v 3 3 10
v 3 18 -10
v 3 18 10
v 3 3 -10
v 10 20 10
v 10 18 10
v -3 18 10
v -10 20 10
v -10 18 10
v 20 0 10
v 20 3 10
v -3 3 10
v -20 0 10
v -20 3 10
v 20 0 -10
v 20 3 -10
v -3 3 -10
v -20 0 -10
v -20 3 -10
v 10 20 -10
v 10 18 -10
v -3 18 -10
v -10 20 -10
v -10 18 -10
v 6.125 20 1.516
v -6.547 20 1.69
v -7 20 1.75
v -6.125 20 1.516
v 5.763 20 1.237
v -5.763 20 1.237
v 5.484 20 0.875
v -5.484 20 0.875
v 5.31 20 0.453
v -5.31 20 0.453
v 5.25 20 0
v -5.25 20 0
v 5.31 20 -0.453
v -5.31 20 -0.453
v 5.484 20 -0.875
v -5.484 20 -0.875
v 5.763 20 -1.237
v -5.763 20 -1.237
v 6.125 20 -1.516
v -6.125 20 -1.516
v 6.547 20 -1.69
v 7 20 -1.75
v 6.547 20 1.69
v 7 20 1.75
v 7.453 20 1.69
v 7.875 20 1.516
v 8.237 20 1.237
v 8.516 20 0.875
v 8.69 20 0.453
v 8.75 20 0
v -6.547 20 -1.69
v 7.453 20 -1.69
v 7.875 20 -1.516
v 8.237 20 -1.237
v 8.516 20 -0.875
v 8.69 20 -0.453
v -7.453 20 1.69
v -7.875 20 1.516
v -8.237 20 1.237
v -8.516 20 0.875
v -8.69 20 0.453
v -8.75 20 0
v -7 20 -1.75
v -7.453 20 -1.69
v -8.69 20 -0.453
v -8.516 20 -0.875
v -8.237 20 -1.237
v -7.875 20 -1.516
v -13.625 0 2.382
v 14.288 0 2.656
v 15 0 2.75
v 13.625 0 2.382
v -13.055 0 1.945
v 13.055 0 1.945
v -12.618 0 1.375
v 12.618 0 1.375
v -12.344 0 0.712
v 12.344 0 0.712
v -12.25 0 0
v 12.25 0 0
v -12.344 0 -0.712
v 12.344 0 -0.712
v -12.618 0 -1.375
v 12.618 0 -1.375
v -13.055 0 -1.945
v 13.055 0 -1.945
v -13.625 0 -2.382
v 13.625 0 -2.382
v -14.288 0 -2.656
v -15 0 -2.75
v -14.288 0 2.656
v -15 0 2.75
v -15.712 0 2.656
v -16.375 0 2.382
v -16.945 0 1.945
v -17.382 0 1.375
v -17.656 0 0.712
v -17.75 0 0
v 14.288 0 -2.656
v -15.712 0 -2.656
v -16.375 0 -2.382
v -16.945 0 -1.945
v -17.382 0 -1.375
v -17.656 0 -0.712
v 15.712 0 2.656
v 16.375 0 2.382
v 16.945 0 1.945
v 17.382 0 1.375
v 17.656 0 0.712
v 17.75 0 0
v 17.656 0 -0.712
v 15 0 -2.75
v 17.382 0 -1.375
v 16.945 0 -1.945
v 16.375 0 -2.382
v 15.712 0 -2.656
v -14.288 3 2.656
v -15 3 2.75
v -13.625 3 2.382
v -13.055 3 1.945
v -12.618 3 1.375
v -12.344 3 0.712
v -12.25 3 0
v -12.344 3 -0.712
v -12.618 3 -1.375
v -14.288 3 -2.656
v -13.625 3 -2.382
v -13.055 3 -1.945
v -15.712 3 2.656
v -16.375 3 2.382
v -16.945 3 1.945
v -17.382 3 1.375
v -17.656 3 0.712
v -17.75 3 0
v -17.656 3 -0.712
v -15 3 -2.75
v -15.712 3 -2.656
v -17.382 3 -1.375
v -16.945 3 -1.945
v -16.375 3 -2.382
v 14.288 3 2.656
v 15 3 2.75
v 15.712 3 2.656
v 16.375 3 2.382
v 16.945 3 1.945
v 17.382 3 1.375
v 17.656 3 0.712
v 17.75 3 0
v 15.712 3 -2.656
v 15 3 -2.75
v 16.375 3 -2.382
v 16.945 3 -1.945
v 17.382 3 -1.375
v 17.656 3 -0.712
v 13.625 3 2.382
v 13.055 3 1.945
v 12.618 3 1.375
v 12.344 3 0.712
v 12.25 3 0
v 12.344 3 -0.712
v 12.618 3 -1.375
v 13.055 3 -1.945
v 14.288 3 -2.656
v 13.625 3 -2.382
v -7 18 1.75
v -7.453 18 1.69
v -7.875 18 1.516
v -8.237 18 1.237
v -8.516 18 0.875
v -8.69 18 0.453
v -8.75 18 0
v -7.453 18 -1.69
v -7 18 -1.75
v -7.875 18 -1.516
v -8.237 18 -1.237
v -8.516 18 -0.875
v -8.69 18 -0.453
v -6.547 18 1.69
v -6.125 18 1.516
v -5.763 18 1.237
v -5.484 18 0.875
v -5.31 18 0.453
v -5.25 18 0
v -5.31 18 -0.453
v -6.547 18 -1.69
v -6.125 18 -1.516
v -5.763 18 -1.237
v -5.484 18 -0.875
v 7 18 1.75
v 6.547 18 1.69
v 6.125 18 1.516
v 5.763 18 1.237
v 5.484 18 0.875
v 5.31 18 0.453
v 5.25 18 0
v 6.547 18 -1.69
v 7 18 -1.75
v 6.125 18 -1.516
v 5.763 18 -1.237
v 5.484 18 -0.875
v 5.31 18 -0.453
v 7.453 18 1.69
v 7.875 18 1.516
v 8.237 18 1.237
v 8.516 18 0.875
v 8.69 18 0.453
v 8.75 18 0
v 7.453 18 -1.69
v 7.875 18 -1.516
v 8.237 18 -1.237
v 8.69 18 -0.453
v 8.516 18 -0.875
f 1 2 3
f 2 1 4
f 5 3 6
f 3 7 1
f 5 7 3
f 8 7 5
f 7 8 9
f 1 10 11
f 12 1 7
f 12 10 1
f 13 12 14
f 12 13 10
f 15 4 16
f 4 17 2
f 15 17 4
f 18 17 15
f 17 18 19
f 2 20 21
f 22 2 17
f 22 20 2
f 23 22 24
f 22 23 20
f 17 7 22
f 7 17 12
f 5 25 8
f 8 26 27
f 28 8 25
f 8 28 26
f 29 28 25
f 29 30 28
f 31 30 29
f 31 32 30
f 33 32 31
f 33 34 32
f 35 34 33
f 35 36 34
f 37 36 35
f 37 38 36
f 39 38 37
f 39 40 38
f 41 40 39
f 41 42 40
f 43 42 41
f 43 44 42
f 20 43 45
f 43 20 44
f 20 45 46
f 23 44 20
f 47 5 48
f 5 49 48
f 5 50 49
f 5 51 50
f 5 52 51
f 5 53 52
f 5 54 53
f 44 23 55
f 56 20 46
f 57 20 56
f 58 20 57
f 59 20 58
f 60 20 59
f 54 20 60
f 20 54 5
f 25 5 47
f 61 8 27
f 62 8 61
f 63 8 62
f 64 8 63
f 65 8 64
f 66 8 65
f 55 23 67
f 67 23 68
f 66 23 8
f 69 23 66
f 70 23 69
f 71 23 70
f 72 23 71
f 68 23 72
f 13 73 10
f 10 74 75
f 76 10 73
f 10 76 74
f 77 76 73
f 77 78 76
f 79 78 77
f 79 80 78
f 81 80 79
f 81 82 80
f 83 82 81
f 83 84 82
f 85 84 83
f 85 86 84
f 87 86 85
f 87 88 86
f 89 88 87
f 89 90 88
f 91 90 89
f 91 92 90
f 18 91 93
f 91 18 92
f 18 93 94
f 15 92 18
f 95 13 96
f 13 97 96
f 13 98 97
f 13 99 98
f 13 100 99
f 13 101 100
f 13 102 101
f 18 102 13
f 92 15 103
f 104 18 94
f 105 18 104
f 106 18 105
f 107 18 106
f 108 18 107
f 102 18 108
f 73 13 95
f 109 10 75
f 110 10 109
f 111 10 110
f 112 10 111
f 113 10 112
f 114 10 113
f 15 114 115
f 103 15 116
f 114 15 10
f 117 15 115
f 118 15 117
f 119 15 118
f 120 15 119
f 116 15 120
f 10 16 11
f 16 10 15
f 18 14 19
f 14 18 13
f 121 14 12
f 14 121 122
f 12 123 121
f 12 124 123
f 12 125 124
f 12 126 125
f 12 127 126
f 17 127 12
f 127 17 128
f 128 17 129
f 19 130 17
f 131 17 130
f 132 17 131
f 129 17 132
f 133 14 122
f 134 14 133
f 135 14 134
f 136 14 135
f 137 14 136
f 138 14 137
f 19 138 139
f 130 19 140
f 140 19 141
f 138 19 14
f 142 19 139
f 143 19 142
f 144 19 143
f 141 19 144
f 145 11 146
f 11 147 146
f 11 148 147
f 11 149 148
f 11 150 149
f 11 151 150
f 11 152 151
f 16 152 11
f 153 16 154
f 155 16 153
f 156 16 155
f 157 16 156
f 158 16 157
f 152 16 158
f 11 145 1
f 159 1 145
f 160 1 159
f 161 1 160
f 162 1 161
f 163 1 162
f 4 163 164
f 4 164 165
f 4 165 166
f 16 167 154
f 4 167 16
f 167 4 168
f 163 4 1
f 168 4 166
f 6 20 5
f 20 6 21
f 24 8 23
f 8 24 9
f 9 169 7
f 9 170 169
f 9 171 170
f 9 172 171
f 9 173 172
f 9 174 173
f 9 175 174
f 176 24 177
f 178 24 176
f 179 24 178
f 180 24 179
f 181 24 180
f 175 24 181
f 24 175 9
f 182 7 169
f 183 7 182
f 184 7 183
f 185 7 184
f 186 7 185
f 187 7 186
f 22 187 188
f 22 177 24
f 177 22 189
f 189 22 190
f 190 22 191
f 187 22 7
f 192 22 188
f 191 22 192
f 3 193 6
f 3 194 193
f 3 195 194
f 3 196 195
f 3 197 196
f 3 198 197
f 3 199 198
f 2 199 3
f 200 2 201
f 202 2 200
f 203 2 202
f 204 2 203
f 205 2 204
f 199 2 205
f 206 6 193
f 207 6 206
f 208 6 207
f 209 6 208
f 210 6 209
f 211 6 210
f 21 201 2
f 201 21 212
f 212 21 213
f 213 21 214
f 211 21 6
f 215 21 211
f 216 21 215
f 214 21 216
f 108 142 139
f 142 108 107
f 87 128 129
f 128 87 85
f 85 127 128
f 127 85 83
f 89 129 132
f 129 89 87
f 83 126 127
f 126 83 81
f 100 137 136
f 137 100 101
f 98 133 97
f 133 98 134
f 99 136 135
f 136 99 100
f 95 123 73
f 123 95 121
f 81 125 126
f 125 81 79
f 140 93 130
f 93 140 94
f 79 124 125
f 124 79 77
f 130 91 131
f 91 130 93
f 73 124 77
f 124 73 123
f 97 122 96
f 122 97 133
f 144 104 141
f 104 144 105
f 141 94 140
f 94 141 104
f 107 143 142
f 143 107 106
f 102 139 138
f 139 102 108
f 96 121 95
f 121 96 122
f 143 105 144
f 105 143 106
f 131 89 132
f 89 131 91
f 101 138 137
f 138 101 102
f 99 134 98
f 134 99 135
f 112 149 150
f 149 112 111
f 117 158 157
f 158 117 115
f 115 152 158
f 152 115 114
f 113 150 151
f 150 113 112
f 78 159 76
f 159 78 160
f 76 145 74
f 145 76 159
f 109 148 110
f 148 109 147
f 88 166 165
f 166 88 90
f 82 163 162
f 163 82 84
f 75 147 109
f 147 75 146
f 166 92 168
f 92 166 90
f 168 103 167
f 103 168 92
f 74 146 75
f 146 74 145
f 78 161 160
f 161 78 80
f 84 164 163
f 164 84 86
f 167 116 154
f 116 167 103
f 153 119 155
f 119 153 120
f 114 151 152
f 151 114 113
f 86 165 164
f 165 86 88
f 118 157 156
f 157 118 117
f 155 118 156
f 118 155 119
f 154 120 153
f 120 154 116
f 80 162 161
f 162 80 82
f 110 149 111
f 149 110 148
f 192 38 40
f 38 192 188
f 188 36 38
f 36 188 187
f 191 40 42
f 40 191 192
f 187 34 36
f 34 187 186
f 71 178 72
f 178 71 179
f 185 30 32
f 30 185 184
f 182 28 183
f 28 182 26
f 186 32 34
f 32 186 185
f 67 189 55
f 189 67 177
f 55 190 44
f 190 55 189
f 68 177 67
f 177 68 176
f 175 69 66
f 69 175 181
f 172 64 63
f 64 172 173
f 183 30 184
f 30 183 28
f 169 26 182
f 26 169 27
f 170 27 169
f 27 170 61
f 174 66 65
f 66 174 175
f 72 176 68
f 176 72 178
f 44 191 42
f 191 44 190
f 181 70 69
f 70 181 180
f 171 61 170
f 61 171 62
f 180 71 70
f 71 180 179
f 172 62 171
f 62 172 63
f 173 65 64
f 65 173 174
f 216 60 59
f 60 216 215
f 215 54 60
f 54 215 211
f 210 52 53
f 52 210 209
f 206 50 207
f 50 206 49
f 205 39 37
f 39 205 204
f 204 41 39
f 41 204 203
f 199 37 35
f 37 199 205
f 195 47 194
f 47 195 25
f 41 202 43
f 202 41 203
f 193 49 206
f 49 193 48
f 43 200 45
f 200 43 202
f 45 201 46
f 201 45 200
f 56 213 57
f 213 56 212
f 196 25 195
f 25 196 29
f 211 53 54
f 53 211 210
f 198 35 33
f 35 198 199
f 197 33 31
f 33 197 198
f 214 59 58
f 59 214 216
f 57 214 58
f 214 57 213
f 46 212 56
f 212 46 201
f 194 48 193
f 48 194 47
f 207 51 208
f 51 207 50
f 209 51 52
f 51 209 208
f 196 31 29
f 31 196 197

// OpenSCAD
difference()
{
    union()
    {
        translate([-3,0,-10])
            cube([6,20,20]);
        
        translate([-20,0,-10])
            cube([40,3,20]);
        
        translate([-10,20-2,-10])
            cube([20,2,20]);
    }
    
    union()
    {
        translate([-15,0,0])
            rotate([270,0,0])
                cylinder(d=5.5,h=4,$fn=24);
        translate([15,0,0])
            rotate([270,0,0])
                cylinder(d=5.5,h=4,$fn=24);
        
        translate([-7,20-2,0])
            rotate([270,0,0])
                cylinder(d=3.5,h=4,$fn=24);
        translate([7,20-2,0])
            rotate([270,0,0])
                cylinder(d=3.5,h=4,$fn=24);
    }
}
